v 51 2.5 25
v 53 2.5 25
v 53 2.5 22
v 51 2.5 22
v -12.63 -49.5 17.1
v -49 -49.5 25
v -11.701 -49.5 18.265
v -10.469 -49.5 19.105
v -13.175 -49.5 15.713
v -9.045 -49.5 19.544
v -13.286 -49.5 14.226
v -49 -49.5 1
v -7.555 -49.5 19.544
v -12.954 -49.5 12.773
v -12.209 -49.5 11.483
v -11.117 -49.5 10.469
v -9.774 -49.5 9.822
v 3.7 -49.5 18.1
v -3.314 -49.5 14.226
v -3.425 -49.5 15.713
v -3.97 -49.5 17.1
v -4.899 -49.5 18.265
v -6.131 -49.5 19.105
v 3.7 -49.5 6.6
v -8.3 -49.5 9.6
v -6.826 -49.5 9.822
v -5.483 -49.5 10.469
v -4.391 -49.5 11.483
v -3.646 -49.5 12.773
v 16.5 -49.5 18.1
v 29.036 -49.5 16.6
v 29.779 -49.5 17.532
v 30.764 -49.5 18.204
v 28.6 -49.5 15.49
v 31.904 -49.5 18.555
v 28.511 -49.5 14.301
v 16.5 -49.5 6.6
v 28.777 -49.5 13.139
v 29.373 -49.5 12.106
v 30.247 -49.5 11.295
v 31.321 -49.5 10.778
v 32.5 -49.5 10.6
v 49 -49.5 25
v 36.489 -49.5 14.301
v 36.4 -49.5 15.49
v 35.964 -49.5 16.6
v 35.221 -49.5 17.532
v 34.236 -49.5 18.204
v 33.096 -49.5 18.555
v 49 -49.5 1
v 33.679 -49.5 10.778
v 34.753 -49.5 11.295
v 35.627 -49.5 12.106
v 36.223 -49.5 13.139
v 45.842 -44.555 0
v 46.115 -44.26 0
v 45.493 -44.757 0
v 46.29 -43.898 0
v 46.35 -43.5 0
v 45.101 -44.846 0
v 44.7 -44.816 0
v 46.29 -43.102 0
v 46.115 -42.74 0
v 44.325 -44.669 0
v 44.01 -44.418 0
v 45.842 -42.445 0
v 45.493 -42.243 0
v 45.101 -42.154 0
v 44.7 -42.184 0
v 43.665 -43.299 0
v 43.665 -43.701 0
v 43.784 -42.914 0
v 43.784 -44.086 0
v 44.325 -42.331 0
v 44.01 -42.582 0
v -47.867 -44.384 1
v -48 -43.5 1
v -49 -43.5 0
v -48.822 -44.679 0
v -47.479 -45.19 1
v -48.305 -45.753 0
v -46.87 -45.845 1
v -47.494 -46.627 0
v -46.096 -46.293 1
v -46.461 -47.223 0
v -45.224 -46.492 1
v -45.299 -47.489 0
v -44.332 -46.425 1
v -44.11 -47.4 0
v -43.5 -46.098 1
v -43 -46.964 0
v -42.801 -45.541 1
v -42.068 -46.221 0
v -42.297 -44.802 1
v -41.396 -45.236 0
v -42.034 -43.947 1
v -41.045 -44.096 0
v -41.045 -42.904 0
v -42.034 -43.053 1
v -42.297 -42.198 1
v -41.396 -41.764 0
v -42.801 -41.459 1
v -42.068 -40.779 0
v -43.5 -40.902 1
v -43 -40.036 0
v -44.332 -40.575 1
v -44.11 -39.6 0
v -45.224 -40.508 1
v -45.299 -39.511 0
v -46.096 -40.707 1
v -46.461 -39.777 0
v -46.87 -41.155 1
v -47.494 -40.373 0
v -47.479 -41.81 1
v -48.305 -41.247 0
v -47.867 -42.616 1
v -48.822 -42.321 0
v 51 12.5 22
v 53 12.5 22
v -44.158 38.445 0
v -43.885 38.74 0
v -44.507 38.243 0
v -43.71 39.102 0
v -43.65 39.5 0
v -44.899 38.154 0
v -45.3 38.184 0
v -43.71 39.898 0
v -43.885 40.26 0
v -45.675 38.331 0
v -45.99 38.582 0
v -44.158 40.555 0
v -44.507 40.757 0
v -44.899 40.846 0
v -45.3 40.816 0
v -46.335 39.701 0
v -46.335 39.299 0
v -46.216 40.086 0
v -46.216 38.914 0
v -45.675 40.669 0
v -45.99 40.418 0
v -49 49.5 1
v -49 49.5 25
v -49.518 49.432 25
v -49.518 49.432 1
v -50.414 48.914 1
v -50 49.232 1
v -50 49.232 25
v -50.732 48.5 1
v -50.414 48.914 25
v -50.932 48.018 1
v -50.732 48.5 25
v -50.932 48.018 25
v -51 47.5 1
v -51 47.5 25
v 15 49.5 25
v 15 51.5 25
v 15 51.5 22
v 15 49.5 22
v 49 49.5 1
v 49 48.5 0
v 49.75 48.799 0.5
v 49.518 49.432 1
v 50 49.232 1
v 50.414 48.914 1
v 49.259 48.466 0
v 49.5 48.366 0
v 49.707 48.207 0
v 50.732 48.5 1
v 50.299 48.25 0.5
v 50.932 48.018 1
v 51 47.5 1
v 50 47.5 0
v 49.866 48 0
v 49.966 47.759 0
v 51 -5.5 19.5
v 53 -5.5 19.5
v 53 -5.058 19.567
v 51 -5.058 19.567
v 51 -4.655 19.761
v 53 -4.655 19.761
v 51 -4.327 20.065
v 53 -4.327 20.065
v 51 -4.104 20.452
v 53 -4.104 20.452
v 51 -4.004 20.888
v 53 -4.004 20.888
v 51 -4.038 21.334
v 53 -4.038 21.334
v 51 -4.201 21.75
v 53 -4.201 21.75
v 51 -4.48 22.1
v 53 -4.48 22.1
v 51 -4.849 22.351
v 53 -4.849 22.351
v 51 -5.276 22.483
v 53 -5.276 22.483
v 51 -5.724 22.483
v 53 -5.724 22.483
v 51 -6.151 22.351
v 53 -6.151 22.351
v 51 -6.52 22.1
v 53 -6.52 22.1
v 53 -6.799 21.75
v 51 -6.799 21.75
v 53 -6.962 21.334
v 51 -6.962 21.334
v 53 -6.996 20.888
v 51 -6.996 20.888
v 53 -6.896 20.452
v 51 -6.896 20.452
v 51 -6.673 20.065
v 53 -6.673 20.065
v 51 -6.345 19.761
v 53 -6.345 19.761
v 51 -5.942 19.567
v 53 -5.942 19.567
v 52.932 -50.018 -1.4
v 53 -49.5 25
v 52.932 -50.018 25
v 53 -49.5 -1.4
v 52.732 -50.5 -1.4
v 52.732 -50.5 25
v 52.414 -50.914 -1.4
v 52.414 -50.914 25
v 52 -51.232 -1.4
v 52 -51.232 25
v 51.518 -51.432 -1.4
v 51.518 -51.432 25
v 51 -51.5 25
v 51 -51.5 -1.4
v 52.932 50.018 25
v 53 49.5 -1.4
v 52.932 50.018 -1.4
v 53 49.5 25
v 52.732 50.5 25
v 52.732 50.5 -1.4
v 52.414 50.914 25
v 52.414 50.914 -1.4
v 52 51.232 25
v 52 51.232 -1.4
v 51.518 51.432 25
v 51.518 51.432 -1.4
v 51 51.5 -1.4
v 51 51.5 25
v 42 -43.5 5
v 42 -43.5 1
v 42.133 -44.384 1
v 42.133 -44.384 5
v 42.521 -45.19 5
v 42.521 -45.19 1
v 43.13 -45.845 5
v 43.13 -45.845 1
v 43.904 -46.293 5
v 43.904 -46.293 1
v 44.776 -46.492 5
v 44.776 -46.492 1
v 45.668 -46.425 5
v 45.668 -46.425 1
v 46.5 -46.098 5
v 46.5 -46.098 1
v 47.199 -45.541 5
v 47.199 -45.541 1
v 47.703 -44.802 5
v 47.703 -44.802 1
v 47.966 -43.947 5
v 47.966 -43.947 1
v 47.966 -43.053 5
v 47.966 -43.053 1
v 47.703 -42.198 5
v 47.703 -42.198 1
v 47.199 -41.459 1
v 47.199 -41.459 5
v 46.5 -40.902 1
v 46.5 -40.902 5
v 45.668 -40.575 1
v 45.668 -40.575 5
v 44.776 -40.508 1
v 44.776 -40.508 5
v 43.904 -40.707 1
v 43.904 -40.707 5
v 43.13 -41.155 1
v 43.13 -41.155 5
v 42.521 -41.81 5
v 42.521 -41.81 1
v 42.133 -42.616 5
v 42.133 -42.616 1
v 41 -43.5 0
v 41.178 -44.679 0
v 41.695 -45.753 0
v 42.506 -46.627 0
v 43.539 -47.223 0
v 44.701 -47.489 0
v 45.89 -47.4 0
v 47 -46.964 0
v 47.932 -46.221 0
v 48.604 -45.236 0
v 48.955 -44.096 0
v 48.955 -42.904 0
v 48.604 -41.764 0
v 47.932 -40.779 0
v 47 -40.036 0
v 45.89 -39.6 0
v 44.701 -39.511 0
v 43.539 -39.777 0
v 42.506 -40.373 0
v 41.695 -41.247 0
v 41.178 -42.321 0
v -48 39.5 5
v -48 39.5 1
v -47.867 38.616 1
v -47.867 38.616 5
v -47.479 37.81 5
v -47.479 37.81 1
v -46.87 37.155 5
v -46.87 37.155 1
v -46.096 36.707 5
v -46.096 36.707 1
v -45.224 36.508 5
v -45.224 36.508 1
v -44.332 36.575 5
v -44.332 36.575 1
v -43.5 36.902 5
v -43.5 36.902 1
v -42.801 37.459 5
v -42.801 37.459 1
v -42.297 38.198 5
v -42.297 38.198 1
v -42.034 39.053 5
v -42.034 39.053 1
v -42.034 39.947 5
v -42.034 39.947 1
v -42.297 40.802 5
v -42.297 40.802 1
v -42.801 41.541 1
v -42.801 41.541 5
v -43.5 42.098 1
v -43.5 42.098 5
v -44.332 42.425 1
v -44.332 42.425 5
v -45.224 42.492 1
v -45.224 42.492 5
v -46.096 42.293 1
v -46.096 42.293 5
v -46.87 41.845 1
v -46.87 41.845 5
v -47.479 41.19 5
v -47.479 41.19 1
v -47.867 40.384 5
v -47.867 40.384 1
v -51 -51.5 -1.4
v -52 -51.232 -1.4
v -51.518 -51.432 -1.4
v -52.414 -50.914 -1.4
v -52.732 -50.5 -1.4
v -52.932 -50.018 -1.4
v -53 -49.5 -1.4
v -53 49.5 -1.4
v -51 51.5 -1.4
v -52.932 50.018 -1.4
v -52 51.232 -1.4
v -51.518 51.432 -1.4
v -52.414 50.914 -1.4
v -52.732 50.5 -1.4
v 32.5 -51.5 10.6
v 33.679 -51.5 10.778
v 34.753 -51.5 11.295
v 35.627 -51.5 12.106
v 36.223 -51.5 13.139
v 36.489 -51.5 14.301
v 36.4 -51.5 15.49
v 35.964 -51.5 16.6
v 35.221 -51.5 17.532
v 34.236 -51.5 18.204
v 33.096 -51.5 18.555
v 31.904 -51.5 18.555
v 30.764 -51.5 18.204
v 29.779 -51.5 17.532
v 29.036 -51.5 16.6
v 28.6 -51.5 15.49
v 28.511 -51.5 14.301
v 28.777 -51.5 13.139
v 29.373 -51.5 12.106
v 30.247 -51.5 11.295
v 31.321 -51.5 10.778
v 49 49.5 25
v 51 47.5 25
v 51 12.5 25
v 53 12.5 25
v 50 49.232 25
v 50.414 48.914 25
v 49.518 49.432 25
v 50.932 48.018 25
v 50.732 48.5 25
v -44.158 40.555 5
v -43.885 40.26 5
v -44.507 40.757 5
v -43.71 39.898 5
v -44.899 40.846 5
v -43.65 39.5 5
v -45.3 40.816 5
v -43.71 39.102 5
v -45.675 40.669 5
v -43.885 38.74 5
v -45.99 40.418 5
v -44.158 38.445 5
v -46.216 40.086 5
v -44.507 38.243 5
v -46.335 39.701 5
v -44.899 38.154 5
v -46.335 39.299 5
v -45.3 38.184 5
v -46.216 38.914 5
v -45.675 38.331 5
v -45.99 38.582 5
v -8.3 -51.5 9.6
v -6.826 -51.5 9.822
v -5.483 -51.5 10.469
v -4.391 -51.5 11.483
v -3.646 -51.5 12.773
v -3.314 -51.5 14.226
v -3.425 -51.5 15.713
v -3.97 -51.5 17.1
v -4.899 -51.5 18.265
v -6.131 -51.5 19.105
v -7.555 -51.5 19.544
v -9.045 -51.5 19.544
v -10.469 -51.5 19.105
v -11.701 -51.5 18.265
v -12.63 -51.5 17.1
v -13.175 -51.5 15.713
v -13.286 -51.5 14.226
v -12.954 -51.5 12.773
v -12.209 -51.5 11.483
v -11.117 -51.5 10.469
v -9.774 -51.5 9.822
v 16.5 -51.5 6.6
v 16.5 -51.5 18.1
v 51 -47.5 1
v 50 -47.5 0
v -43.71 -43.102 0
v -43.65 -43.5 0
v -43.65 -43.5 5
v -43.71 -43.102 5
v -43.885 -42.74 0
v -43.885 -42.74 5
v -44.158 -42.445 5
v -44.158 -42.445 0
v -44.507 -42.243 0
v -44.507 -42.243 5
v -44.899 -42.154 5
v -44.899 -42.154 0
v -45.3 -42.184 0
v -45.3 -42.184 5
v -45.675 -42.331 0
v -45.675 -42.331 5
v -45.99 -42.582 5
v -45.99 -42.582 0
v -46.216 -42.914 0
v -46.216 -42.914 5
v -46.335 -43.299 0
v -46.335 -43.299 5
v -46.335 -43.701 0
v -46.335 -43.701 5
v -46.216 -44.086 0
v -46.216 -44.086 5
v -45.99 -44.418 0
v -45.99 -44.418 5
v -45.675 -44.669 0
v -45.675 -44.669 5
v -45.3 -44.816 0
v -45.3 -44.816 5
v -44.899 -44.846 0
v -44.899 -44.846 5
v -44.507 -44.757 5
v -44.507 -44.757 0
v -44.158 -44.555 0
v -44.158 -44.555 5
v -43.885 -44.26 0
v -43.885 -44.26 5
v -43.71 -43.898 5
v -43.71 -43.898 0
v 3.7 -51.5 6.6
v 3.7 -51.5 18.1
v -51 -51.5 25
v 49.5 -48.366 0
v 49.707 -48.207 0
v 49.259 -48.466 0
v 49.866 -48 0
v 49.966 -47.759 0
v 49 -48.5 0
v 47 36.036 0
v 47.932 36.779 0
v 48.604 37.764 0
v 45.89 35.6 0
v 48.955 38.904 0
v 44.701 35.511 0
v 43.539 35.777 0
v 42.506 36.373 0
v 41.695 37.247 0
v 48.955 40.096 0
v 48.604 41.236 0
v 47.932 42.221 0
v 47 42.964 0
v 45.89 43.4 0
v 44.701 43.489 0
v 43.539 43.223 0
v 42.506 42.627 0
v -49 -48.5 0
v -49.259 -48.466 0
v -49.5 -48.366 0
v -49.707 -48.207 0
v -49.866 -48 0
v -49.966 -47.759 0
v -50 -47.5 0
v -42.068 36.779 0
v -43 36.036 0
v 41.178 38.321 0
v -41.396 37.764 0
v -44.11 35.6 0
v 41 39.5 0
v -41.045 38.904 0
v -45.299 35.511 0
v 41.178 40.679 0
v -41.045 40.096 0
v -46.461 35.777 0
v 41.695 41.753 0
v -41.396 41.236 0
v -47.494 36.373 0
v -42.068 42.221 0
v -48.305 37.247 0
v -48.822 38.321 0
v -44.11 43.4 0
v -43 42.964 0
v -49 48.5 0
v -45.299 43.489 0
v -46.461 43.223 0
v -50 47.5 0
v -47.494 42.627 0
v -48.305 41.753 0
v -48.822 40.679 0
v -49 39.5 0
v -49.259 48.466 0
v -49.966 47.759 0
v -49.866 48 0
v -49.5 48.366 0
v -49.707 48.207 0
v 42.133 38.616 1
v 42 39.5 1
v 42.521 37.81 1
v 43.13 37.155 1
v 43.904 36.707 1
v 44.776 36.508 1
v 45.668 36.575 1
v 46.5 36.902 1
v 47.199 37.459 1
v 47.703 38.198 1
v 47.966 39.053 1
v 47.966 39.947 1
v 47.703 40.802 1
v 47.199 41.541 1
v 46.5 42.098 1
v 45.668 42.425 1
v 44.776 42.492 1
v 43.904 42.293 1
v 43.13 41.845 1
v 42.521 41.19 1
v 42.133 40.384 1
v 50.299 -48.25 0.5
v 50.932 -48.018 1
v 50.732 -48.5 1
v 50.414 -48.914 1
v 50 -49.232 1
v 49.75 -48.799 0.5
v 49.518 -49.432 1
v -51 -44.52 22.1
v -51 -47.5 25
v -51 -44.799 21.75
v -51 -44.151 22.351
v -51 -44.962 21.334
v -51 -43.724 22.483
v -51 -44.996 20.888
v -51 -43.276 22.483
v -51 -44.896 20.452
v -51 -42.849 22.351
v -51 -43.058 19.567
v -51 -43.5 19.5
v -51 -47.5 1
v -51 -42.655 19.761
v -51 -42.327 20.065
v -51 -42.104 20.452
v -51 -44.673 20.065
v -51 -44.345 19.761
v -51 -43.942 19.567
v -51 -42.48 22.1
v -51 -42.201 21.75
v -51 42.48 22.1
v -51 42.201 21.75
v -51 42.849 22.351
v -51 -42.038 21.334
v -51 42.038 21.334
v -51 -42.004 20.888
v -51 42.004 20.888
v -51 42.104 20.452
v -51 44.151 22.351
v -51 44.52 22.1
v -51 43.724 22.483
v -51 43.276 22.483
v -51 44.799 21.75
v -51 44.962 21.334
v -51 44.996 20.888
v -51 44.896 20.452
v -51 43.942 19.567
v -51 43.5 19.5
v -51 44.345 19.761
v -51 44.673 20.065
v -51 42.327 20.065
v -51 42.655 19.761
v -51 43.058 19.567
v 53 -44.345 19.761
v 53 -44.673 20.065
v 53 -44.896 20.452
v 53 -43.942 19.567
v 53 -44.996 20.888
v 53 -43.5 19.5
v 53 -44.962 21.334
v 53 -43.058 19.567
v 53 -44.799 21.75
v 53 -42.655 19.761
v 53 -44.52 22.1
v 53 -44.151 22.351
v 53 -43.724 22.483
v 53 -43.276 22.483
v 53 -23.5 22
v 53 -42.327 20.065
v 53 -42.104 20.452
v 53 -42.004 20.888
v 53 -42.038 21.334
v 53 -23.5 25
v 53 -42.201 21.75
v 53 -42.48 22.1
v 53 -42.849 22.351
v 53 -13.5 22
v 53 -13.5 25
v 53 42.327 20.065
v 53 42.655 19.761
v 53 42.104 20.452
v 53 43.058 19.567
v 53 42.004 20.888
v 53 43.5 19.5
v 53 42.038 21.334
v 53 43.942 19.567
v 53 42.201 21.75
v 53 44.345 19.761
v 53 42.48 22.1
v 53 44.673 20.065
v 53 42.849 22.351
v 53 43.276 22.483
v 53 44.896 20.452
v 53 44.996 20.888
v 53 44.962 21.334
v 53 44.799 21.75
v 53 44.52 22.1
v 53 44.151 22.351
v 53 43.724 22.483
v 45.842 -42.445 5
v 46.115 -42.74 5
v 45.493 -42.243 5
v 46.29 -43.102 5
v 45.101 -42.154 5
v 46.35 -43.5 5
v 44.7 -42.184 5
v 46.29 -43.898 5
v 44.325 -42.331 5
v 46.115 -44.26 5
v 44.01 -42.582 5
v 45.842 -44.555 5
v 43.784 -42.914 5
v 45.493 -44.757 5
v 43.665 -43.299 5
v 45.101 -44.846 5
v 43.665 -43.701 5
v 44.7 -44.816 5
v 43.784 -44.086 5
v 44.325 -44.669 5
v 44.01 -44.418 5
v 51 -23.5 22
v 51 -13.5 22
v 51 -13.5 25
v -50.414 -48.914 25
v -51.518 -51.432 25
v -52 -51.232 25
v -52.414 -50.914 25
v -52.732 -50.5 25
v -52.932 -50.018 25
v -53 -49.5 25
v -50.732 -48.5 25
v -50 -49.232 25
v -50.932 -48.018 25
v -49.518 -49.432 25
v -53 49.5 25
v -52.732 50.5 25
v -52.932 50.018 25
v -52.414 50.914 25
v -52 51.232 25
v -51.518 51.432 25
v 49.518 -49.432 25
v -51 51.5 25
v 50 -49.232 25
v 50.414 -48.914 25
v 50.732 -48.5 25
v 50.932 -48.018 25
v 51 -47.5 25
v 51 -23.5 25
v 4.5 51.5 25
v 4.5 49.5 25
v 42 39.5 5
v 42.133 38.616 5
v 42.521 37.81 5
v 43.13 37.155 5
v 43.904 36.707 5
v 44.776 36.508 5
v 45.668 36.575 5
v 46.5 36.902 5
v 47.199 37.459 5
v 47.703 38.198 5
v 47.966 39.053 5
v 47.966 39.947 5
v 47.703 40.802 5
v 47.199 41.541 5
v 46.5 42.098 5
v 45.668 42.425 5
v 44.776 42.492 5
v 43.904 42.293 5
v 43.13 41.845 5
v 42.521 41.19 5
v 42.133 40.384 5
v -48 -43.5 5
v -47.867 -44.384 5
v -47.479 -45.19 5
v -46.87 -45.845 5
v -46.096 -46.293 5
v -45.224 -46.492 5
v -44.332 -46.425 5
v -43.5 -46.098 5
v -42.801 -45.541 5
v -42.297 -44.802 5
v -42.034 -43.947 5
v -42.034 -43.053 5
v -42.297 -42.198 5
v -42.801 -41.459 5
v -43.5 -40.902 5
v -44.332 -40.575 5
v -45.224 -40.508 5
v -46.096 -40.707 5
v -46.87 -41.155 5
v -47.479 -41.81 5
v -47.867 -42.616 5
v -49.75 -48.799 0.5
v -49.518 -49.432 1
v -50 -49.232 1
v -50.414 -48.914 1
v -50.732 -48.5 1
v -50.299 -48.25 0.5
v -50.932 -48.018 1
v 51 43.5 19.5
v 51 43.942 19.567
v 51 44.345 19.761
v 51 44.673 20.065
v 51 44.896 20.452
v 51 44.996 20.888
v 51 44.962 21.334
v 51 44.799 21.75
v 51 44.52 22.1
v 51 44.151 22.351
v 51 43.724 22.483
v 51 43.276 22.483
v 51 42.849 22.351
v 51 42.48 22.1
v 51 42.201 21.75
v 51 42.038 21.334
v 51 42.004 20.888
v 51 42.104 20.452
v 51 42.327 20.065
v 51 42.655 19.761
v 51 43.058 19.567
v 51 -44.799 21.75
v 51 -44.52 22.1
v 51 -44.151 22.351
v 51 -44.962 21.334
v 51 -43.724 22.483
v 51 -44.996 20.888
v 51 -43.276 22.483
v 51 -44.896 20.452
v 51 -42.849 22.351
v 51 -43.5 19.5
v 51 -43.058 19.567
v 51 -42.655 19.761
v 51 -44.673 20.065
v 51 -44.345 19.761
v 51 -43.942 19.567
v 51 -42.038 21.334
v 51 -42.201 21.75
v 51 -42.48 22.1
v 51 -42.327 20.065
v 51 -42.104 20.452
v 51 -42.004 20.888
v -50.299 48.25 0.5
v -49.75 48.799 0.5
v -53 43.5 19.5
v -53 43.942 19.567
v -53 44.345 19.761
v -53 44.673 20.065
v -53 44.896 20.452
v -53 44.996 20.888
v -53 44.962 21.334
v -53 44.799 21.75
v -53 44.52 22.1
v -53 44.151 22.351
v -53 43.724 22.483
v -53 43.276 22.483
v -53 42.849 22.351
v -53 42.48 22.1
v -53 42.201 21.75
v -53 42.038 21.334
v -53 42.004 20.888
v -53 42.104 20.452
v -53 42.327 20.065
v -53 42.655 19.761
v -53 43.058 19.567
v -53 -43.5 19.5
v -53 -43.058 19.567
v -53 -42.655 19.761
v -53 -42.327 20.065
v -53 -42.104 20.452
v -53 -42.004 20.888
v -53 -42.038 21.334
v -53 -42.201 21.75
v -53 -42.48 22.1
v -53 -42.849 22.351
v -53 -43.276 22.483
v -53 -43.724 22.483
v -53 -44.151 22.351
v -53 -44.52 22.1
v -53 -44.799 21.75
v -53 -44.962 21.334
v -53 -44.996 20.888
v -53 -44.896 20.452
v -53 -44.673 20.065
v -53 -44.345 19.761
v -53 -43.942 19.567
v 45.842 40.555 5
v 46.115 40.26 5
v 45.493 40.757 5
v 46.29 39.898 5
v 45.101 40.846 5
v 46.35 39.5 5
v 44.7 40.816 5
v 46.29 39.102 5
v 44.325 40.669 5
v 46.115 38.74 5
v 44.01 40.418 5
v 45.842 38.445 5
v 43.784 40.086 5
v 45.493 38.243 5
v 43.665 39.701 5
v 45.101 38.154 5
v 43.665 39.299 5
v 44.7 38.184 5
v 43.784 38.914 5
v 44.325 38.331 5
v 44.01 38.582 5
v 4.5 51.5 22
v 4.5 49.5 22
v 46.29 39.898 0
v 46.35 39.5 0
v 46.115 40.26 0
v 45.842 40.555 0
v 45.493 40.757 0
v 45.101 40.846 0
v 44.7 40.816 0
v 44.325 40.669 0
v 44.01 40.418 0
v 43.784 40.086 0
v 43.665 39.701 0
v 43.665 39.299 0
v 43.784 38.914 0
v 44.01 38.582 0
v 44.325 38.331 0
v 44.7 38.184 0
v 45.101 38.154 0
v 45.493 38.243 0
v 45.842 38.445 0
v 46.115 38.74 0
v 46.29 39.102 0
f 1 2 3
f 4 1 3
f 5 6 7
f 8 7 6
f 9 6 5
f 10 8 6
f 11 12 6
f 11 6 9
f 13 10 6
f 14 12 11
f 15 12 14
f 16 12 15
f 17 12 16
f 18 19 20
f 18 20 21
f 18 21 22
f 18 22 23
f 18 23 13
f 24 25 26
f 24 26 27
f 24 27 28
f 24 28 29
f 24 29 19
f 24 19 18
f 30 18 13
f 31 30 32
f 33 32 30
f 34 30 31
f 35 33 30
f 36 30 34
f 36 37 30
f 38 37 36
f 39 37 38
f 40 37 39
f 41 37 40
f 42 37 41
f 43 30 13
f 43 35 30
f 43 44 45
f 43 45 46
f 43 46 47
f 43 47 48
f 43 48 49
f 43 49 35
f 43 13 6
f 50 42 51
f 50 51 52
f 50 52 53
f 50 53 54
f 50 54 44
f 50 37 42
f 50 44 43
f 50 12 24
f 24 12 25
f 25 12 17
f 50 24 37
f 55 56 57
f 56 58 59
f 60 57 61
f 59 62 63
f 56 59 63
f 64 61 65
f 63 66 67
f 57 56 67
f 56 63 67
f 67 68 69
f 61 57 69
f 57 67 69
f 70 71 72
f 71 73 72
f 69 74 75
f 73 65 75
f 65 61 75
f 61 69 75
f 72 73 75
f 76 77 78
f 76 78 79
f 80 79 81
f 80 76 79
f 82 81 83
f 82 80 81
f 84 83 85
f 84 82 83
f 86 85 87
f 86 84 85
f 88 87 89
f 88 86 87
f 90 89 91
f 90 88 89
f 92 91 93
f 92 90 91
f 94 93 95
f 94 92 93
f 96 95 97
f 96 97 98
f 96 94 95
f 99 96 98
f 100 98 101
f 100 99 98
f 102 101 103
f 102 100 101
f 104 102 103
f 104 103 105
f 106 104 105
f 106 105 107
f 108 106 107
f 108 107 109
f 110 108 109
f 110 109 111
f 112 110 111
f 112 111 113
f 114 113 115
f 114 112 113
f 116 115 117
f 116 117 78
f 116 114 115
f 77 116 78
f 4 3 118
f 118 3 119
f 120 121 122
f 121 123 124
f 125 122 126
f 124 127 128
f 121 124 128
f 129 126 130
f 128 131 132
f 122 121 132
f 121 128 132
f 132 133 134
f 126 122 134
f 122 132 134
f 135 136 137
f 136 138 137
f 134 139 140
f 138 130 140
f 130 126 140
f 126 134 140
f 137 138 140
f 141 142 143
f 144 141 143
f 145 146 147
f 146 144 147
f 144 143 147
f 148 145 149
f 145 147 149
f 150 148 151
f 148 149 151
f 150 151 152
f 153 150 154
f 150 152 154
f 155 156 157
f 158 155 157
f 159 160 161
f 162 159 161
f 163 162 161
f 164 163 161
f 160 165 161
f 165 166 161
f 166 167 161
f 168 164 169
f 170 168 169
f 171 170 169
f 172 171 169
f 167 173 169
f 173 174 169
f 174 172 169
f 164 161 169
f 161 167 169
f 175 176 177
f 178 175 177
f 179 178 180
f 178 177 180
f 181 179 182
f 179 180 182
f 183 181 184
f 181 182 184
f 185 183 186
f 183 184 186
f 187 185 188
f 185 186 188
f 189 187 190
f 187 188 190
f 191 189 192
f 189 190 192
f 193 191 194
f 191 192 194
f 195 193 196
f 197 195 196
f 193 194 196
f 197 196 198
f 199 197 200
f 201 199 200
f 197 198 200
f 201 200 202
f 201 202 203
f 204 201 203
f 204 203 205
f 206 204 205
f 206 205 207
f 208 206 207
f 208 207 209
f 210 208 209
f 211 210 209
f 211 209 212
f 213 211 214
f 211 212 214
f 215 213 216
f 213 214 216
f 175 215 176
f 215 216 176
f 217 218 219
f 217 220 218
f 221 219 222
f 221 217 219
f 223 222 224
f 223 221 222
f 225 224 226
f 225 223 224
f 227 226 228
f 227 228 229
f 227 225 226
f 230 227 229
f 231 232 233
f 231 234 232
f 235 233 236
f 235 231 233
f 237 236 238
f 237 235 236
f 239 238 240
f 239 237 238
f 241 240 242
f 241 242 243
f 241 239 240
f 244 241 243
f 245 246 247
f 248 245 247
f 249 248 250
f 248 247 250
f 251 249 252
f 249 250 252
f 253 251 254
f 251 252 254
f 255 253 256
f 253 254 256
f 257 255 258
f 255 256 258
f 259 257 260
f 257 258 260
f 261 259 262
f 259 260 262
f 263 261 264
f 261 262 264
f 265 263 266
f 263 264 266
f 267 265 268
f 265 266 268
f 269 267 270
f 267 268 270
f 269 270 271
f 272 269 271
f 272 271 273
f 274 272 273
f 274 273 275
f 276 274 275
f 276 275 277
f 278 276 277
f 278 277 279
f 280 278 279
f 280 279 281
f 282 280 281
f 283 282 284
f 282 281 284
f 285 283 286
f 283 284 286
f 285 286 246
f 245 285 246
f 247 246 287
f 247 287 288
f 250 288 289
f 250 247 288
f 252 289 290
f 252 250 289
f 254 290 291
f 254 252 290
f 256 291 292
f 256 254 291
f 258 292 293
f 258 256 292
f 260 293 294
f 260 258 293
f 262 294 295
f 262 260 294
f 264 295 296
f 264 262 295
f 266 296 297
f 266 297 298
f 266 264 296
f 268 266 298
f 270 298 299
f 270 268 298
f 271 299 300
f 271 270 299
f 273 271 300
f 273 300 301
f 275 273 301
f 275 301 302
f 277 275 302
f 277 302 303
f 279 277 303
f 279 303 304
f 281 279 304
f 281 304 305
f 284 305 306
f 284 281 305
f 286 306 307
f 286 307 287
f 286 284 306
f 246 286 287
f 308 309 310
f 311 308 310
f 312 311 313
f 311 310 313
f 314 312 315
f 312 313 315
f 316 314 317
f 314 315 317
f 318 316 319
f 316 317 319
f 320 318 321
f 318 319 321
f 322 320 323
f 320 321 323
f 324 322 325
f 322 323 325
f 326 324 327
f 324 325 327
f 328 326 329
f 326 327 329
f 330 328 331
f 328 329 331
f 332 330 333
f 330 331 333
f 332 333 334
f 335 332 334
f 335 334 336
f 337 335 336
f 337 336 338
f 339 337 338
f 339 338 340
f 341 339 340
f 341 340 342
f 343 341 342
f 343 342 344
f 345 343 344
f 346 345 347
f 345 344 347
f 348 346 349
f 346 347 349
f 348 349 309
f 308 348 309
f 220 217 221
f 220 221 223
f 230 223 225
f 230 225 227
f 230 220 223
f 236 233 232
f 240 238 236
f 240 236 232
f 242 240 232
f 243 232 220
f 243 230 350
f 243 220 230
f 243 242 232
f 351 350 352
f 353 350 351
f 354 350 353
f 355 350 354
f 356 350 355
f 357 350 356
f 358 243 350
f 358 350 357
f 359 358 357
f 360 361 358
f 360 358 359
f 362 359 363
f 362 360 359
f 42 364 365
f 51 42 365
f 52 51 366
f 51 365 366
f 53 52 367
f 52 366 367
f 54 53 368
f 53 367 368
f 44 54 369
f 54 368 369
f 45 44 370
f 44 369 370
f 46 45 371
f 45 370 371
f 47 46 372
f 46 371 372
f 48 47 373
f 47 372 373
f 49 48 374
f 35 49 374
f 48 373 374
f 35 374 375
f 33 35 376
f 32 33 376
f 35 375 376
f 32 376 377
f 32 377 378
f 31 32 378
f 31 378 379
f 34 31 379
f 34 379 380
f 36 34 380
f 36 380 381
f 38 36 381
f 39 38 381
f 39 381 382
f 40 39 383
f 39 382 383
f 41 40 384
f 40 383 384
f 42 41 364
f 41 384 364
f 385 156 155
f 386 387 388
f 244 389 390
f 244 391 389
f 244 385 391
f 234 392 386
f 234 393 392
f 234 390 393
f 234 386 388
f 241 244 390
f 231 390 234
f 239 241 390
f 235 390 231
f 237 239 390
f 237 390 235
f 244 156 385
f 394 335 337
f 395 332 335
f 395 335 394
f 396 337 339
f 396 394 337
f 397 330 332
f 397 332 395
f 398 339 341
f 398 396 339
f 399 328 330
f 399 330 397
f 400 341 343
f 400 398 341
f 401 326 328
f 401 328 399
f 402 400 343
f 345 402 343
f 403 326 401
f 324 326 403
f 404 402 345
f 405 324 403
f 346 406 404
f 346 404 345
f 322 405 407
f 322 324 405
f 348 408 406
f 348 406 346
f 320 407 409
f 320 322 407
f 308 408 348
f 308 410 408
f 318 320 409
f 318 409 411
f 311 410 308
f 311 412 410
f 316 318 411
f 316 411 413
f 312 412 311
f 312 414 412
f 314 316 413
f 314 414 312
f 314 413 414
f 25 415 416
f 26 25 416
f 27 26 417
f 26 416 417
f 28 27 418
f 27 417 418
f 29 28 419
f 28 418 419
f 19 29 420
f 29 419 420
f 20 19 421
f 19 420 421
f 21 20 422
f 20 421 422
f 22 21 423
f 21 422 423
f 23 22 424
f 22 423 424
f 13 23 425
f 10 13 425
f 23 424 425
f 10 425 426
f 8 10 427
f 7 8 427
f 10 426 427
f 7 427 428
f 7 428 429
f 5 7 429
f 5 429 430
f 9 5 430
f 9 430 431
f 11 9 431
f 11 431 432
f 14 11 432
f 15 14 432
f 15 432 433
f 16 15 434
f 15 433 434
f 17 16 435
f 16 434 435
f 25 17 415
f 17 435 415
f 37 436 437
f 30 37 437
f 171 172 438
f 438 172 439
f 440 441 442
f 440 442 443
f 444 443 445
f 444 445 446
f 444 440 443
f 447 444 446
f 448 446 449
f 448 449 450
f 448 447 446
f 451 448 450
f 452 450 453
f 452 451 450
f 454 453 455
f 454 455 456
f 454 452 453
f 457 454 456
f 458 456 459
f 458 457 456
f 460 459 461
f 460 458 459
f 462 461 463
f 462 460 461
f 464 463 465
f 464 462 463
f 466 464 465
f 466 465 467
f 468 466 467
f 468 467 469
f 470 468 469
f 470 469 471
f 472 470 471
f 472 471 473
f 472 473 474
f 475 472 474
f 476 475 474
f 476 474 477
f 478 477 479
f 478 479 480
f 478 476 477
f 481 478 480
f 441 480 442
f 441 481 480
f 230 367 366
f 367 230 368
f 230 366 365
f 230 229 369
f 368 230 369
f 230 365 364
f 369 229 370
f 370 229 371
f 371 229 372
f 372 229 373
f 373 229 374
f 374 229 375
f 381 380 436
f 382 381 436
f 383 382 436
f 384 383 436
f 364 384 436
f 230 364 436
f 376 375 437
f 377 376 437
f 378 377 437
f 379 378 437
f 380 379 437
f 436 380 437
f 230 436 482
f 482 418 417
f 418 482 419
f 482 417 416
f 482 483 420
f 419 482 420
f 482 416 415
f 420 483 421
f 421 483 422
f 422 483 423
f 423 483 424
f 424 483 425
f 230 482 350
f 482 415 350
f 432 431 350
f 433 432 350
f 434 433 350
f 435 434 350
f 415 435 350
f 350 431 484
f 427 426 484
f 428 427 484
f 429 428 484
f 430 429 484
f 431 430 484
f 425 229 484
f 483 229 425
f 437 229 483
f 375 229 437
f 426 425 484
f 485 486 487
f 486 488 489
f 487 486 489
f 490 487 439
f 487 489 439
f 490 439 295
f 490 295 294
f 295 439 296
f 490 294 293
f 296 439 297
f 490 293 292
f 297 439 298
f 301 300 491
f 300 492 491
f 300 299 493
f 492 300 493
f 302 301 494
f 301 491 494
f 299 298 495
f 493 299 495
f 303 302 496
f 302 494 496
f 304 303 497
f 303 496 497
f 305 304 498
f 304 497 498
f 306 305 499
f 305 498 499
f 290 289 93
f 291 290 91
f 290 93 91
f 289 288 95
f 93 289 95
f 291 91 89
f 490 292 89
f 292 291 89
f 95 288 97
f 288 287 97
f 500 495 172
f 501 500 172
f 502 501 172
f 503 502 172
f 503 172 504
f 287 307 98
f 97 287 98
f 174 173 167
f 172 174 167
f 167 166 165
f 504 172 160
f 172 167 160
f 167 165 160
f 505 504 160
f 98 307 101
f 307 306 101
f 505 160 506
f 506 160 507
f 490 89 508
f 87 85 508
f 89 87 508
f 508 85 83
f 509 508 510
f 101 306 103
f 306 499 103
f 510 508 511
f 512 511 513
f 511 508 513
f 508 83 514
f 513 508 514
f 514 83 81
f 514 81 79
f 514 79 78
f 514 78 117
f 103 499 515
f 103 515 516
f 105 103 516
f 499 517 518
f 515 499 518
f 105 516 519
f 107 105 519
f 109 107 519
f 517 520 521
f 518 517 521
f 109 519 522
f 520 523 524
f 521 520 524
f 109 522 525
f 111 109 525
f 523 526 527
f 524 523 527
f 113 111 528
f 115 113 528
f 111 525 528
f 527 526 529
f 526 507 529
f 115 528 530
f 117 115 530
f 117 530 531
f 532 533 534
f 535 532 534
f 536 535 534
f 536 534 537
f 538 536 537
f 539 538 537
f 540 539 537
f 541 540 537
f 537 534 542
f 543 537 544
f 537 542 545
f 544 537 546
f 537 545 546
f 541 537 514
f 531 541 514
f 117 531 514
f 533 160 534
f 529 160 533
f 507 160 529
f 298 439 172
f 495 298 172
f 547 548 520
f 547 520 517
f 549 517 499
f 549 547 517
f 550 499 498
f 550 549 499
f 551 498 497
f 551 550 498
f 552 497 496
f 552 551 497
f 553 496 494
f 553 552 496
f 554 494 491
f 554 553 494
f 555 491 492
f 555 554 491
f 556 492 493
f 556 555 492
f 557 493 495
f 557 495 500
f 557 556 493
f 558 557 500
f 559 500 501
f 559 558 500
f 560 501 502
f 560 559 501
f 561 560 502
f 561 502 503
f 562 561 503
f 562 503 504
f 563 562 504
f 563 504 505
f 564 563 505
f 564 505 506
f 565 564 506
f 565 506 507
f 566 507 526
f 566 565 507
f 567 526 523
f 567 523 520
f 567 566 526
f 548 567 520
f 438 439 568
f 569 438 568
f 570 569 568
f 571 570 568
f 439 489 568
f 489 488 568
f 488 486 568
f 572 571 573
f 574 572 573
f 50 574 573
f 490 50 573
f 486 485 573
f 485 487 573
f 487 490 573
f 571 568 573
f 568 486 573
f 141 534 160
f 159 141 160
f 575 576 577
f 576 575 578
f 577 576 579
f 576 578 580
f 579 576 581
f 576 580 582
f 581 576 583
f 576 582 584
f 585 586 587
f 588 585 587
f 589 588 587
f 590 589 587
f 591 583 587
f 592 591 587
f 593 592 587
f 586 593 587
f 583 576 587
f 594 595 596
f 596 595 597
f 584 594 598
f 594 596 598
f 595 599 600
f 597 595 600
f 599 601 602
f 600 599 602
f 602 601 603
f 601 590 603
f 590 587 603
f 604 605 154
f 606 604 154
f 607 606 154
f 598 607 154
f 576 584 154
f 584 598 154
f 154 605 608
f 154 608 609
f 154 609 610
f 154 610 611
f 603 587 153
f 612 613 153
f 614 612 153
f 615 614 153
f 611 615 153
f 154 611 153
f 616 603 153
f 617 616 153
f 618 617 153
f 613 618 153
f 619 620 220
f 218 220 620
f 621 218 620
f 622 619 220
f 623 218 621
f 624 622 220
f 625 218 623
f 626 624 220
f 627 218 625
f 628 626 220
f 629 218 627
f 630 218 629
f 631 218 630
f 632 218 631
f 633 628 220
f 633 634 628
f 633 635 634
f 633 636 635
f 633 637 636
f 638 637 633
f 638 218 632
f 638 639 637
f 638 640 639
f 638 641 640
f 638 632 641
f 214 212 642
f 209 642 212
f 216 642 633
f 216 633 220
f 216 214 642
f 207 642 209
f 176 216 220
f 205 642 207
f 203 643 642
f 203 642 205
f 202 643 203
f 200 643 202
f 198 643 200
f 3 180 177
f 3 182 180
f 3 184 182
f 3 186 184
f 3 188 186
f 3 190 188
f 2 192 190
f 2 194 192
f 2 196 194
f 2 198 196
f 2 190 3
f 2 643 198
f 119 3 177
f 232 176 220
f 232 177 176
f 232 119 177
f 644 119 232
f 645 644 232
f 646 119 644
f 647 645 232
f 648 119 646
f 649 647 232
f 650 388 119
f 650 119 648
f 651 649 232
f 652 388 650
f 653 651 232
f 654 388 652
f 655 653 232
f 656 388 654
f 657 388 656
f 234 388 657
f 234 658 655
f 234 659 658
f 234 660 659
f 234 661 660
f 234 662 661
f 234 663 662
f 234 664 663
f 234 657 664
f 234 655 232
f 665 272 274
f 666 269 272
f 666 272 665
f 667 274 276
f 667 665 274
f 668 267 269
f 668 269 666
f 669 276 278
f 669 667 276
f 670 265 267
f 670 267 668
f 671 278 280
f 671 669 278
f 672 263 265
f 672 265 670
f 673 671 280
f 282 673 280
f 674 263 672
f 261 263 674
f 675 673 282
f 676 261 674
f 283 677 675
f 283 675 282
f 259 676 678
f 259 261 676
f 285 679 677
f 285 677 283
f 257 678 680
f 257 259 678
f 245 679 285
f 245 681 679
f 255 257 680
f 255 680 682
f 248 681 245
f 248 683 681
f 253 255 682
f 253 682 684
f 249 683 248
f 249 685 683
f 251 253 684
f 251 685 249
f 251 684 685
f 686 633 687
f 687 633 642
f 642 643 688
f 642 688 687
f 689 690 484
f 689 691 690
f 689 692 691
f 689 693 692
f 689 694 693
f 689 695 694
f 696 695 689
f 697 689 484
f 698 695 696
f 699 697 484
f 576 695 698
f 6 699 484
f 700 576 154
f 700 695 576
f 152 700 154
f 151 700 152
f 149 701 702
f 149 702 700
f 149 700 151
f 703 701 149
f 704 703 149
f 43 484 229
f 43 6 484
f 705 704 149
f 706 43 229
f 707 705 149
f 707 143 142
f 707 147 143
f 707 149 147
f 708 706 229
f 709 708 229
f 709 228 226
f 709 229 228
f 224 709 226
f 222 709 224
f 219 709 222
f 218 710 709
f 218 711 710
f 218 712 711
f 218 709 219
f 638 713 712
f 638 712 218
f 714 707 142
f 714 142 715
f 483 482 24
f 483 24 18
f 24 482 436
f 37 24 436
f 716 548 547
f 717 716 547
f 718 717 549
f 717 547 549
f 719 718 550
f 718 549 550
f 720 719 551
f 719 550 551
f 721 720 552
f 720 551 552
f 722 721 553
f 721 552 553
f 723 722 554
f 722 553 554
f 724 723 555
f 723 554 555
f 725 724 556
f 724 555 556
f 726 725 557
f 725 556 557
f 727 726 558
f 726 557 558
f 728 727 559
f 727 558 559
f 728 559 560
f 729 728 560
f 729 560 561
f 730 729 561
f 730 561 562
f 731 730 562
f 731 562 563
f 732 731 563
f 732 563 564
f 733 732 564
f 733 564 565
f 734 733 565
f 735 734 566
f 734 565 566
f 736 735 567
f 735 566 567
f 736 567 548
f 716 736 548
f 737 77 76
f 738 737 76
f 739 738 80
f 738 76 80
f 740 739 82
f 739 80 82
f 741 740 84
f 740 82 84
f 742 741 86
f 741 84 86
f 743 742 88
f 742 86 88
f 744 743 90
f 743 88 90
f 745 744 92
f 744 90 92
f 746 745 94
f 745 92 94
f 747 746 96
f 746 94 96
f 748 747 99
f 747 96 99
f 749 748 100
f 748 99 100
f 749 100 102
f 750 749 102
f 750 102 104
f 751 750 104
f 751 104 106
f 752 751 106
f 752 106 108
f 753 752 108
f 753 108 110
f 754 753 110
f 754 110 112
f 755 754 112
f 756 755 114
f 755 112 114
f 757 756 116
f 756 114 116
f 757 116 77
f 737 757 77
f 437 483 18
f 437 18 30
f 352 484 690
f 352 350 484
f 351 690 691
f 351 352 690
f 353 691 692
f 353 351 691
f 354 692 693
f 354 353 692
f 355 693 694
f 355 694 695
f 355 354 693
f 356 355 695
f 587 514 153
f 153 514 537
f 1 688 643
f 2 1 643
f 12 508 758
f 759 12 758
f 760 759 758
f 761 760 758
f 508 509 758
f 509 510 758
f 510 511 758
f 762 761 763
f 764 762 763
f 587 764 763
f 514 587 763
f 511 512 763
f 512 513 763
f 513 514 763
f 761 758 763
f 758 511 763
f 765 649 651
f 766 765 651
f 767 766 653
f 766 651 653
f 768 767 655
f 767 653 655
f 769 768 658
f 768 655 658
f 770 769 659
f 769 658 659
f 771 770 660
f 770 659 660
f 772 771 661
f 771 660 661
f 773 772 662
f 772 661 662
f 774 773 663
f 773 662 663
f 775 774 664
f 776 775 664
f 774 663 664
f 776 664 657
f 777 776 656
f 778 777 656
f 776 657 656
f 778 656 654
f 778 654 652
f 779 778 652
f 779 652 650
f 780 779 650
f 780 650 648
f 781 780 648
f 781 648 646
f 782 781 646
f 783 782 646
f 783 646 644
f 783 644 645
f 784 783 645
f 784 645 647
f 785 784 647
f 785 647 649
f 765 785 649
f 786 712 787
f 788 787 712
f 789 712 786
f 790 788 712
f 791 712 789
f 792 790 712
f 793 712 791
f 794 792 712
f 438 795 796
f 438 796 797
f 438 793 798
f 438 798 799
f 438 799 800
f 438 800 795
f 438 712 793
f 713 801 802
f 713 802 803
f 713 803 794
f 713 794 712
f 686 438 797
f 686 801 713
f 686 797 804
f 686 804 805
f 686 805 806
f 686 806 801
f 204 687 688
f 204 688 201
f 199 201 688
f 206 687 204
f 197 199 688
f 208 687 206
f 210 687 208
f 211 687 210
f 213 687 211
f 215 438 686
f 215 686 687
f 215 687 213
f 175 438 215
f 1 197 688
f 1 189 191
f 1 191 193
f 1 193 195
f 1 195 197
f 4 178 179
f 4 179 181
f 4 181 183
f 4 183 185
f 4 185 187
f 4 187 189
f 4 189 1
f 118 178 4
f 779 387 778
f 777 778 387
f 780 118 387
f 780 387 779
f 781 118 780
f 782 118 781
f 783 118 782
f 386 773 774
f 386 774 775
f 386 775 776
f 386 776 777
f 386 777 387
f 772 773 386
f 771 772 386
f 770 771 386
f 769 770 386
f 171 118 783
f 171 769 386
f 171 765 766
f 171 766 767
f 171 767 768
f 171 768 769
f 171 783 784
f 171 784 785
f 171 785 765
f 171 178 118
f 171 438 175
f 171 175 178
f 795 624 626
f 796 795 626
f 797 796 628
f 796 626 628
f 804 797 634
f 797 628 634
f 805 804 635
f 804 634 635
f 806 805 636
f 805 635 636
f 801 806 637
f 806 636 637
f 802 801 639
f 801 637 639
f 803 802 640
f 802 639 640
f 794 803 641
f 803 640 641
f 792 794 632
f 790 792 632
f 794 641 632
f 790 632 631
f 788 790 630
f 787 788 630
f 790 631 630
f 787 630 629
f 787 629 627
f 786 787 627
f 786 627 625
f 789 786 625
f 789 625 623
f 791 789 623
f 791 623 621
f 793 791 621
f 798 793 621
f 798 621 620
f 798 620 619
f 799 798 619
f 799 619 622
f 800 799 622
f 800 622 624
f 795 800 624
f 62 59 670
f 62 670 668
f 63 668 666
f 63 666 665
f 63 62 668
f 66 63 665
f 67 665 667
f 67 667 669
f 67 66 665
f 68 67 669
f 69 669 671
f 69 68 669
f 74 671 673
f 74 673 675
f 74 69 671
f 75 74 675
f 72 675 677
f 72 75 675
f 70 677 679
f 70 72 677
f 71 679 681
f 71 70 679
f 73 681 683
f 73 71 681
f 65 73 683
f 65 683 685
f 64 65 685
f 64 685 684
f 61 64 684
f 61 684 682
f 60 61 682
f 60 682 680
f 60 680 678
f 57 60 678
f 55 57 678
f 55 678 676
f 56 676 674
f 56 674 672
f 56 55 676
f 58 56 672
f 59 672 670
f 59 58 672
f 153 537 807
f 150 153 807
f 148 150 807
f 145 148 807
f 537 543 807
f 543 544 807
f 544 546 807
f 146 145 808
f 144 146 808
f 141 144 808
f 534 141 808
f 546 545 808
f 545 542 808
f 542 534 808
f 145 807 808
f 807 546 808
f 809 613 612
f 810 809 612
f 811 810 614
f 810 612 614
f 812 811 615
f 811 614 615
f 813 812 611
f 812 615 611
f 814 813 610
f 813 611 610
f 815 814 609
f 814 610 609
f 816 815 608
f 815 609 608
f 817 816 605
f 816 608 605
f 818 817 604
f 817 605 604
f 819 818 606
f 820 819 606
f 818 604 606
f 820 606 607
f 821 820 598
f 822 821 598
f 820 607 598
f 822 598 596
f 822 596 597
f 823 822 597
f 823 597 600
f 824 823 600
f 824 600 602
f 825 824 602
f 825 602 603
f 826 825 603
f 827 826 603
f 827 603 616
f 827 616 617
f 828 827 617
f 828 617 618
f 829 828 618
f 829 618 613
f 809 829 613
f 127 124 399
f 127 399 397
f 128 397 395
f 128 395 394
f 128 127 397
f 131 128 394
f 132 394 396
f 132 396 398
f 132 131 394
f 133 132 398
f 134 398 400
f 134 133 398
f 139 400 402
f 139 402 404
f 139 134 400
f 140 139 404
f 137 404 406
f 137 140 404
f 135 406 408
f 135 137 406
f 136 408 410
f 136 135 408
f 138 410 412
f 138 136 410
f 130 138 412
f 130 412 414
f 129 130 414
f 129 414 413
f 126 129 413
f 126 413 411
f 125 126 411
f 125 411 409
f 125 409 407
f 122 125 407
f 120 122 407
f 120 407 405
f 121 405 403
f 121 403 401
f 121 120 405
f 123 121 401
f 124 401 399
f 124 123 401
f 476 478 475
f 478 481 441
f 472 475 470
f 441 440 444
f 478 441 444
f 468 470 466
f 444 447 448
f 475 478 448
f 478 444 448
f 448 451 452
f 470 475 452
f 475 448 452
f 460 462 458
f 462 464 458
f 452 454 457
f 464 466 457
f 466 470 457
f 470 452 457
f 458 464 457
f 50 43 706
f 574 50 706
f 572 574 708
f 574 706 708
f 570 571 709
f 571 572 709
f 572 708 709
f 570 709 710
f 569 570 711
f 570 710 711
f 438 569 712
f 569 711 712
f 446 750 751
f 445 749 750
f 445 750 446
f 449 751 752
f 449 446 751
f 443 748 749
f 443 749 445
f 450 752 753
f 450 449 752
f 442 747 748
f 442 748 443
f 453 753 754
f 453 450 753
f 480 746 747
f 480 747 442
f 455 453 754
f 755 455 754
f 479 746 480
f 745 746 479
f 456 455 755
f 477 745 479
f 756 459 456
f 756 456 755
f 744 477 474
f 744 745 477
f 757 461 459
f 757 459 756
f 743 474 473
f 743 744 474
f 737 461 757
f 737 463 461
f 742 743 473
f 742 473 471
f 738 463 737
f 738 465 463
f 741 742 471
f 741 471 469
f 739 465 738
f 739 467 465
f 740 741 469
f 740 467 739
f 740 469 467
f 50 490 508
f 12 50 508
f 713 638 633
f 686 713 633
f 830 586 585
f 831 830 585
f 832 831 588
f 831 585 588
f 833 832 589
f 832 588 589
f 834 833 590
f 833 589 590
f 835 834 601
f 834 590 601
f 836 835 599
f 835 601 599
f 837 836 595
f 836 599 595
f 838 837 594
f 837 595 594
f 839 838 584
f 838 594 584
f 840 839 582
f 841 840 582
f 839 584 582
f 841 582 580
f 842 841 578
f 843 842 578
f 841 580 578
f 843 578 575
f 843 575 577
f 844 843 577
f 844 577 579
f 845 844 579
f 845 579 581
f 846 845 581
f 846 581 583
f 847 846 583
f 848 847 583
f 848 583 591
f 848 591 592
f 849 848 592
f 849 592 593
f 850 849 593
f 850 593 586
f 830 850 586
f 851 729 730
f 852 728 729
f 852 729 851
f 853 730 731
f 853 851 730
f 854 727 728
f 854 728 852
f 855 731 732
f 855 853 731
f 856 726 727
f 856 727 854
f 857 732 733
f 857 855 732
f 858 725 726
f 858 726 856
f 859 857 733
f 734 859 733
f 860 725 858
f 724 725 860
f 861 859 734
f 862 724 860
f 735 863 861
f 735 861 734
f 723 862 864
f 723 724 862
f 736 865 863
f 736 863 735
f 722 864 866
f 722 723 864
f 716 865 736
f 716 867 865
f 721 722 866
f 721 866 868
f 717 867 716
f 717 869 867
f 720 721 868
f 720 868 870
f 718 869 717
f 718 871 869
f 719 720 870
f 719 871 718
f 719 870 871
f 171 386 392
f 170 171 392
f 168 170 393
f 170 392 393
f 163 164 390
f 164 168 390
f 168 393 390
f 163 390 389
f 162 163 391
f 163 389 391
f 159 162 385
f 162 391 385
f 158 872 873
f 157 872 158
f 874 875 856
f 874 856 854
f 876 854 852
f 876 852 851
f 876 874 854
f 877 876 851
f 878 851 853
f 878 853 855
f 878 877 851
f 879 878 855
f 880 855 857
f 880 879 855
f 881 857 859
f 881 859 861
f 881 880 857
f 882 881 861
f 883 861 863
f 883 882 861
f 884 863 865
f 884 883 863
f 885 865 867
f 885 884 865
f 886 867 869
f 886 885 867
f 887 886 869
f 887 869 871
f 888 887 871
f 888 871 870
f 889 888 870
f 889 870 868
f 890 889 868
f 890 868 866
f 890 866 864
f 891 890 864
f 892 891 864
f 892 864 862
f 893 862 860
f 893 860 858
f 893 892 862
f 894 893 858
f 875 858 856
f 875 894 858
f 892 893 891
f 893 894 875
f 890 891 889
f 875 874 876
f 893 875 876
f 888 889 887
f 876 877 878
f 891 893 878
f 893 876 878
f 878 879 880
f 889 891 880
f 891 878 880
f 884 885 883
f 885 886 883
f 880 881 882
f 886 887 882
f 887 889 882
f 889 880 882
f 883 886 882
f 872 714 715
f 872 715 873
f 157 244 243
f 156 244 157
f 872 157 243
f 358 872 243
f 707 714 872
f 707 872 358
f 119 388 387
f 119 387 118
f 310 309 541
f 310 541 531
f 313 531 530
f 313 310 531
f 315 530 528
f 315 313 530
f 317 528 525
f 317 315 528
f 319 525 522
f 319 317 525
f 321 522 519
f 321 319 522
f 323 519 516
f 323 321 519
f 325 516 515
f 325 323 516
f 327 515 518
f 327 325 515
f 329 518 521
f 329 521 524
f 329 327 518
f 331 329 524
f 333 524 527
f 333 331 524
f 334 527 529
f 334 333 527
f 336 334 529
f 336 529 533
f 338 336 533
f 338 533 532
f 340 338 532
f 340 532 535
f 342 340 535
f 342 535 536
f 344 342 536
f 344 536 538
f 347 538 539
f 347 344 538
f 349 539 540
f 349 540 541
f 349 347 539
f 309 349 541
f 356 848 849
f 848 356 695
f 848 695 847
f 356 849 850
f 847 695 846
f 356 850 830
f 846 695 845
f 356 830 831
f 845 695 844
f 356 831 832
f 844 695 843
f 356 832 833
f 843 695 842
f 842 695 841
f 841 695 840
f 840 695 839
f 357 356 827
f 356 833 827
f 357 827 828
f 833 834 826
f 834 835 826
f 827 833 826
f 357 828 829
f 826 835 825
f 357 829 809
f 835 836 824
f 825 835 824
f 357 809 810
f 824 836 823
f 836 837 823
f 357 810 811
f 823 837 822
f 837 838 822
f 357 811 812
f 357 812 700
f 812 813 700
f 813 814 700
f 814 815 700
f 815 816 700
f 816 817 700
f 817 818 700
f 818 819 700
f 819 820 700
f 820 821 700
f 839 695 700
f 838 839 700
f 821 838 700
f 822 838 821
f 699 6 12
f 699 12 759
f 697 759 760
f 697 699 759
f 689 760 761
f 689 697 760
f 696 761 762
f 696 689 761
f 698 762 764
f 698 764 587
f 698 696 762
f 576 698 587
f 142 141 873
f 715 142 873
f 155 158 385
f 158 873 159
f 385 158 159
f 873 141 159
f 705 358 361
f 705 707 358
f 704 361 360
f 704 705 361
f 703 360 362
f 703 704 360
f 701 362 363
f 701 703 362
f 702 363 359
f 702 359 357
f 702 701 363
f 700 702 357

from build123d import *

# Parameters (mm, degrees)
SKETCH_1_W          = 106
SKETCH_1_H          = 103
SKETCH_1_W_2        = 102
SKETCH_1_H_2        = 99
EXTRUDE_1_DEPTH     = 25
SKETCH_2_W          = 106
SKETCH_2_H          = 103
EXTRUDE_2_DEPTH     = 1.4
SKETCH_3_R          = 3
SKETCH_3_R_2        = 1.35
EXTRUDE_3_DEPTH     = 5
SKETCH_4_W          = 12.8
SKETCH_4_H          = 11.5
CUT_EXTRUDE_1_DEPTH = 101
FILLET_1_R          = 2
CHAMFER_1_SIZE      = 1
SKETCH_5_R          = 4
SKETCH_5_R_2        = 5
CUT_EXTRUDE_2_DEPTH = 2
SKETCH_6_W          = 3
SKETCH_6_H          = 10
CUT_EXTRUDE_3_DEPTH = 2
SKETCH_8_R          = 1.5
CUT_EXTRUDE_4_DEPTH = 121.470950855
SKETCH_9_R          = 1.5
CUT_EXTRUDE_5_DEPTH = 2
SKETCH_10_W         = 10.5
SKETCH_10_H         = 3
CUT_EXTRUDE_6_DEPTH = 2


with BuildPart() as part:
    # Эскиз1 → Бобышка-Вытянуть1 (new body)
    with BuildSketch(Plane.XY):
        Rectangle(SKETCH_1_W, SKETCH_1_H)
        Rectangle(SKETCH_1_W_2, SKETCH_1_H_2, mode=Mode.SUBTRACT)
    extrude(amount=EXTRUDE_1_DEPTH)

    # Эскиз2 → Бобышка-Вытянуть2 (add)
    with BuildSketch(Plane(origin=(0, 0, 0), x_dir=(-1, 0, 0), z_dir=(0, 0, -1))):
        Rectangle(SKETCH_2_W, SKETCH_2_H)
    extrude(amount=EXTRUDE_2_DEPTH)

    # Эскиз3 → Бобышка-Вытянуть3 (add)
    # profile 1 of 4: a face of its own
    with BuildSketch(Plane.XY):
        with Locations(Location((-45, 39.5, 0), (0, 0, 180))):
            Circle(SKETCH_3_R)
        with Locations((-45, 39.5)):
            Circle(SKETCH_3_R_2, mode=Mode.SUBTRACT)
    # profile 2 of 4: a face of its own
    with BuildSketch(Plane.XY):
        with Locations(Location((45, 39.5, 0), (0, 0, 180))):
            Circle(SKETCH_3_R)
        with Locations((45, 39.5)):
            Circle(SKETCH_3_R_2, mode=Mode.SUBTRACT)
    # profile 3 of 4: a face of its own
    with BuildSketch(Plane.XY):
        with Locations(Location((-45, -43.5, 0), (0, 0, 180))):
            Circle(SKETCH_3_R)
        with Locations((-45, -43.5)):
            Circle(SKETCH_3_R_2, mode=Mode.SUBTRACT)
    # profile 4 of 4: a face of its own
    with BuildSketch(Plane.XY):
        with Locations(Location((45, -43.5, 0), (0, 0, 180))):
            Circle(SKETCH_3_R)
        with Locations((45, -43.5)):
            Circle(SKETCH_3_R_2, mode=Mode.SUBTRACT)
    extrude(amount=EXTRUDE_3_DEPTH)

    # Эскиз4 → Вырез-Вытянуть1 (cut)
    with BuildSketch(Plane.XZ.offset(51.5)):
        with Locations((10.1, 12.35)):
            Rectangle(SKETCH_4_W, SKETCH_4_H)
    extrude(amount=-CUT_EXTRUDE_1_DEPTH, mode=Mode.SUBTRACT)

    # Скругление1
    fillet_1_edges = [part.edges().sort_by_distance(p)[0] for p in [
        (51, -49.5, 12.5),
        (51, 49.5, 12.5),
        (-51, 49.5, 12.5),
        (-51, -49.5, 12.5),
        (53, -51.5, 11.8),
        (-53, -51.5, 11.8),
        (-53, 51.5, 11.8),
        (53, 51.5, 11.8),
    ]]
    fillet(fillet_1_edges, radius=FILLET_1_R)

    # Фаска1
    chamfer_1_edges = [part.edges().sort_by_distance(p)[0] for p in [
        (-51, 0, 0),
        (0, -49.5, 0),
        (51, 0, 0),
        (0, 49.5, 0),
        (50.414213562, -48.914213562, 0),
        (50.414213562, 48.914213562, 0),
        (-50.414213562, 48.914213562, 0),
        (-50.414213562, -48.914213562, 0),
        (-42, 39.5, 0),
        (48, 39.5, 0),
        (-42, -43.5, 0),
        (48, -43.5, 0),
    ]]
    chamfer(chamfer_1_edges, length=CHAMFER_1_SIZE)

    # Эскиз5 → Вырез-Вытянуть2 (cut)
    with BuildSketch(Plane.XZ.offset(51.5)):
        with Locations(Location((32.5, 14.6, 0), (0, 0, 270))):
            Circle(SKETCH_5_R)
        with Locations(Location((-8.3, 14.6, 0), (0, 0, 270))):
            Circle(SKETCH_5_R_2)
    extrude(amount=-CUT_EXTRUDE_2_DEPTH, mode=Mode.SUBTRACT)

    # Эскиз6 → Вырез-Вытянуть3 (cut)
    with BuildSketch(Plane(origin=(53, 0, 0), x_dir=(0, 0, -1), z_dir=(1, 0, 0))):
        with Locations((-23.5, -18.5)):
            Rectangle(SKETCH_6_W, SKETCH_6_H)
        with Locations((-23.5, 7.5)):
            Rectangle(SKETCH_6_W, SKETCH_6_H)
    extrude(amount=-CUT_EXTRUDE_3_DEPTH, mode=Mode.SUBTRACT)

    # Эскиз8 → Вырез-Вытянуть4 (cut, through all)
    with BuildSketch(Plane(origin=(53, 0, 0), x_dir=(0, 0, -1), z_dir=(1, 0, 0))):
        with Locations((-21, 43.5)):
            Circle(SKETCH_8_R)
        with Locations((-21, -43.5)):
            Circle(SKETCH_8_R)
    extrude(amount=-CUT_EXTRUDE_4_DEPTH, mode=Mode.SUBTRACT)

    # Эскиз9 → Вырез-Вытянуть5 (cut)
    with BuildSketch(Plane(origin=(53, 0, 0), x_dir=(0, 0, -1), z_dir=(1, 0, 0))):
        with Locations((-21, -5.5)):
            Circle(SKETCH_9_R)
    extrude(amount=-CUT_EXTRUDE_5_DEPTH, mode=Mode.SUBTRACT)

    # Эскиз10 → Вырез-Вытянуть6 (cut)
    with BuildSketch(Plane(origin=(0, 51.5, 0), x_dir=(1, 0, 0), z_dir=(0, 1, 0))):
        with Locations((9.75, -23.5)):
            Rectangle(SKETCH_10_W, SKETCH_10_H)
    extrude(amount=-CUT_EXTRUDE_6_DEPTH, mode=Mode.SUBTRACT)


solid = part.part
